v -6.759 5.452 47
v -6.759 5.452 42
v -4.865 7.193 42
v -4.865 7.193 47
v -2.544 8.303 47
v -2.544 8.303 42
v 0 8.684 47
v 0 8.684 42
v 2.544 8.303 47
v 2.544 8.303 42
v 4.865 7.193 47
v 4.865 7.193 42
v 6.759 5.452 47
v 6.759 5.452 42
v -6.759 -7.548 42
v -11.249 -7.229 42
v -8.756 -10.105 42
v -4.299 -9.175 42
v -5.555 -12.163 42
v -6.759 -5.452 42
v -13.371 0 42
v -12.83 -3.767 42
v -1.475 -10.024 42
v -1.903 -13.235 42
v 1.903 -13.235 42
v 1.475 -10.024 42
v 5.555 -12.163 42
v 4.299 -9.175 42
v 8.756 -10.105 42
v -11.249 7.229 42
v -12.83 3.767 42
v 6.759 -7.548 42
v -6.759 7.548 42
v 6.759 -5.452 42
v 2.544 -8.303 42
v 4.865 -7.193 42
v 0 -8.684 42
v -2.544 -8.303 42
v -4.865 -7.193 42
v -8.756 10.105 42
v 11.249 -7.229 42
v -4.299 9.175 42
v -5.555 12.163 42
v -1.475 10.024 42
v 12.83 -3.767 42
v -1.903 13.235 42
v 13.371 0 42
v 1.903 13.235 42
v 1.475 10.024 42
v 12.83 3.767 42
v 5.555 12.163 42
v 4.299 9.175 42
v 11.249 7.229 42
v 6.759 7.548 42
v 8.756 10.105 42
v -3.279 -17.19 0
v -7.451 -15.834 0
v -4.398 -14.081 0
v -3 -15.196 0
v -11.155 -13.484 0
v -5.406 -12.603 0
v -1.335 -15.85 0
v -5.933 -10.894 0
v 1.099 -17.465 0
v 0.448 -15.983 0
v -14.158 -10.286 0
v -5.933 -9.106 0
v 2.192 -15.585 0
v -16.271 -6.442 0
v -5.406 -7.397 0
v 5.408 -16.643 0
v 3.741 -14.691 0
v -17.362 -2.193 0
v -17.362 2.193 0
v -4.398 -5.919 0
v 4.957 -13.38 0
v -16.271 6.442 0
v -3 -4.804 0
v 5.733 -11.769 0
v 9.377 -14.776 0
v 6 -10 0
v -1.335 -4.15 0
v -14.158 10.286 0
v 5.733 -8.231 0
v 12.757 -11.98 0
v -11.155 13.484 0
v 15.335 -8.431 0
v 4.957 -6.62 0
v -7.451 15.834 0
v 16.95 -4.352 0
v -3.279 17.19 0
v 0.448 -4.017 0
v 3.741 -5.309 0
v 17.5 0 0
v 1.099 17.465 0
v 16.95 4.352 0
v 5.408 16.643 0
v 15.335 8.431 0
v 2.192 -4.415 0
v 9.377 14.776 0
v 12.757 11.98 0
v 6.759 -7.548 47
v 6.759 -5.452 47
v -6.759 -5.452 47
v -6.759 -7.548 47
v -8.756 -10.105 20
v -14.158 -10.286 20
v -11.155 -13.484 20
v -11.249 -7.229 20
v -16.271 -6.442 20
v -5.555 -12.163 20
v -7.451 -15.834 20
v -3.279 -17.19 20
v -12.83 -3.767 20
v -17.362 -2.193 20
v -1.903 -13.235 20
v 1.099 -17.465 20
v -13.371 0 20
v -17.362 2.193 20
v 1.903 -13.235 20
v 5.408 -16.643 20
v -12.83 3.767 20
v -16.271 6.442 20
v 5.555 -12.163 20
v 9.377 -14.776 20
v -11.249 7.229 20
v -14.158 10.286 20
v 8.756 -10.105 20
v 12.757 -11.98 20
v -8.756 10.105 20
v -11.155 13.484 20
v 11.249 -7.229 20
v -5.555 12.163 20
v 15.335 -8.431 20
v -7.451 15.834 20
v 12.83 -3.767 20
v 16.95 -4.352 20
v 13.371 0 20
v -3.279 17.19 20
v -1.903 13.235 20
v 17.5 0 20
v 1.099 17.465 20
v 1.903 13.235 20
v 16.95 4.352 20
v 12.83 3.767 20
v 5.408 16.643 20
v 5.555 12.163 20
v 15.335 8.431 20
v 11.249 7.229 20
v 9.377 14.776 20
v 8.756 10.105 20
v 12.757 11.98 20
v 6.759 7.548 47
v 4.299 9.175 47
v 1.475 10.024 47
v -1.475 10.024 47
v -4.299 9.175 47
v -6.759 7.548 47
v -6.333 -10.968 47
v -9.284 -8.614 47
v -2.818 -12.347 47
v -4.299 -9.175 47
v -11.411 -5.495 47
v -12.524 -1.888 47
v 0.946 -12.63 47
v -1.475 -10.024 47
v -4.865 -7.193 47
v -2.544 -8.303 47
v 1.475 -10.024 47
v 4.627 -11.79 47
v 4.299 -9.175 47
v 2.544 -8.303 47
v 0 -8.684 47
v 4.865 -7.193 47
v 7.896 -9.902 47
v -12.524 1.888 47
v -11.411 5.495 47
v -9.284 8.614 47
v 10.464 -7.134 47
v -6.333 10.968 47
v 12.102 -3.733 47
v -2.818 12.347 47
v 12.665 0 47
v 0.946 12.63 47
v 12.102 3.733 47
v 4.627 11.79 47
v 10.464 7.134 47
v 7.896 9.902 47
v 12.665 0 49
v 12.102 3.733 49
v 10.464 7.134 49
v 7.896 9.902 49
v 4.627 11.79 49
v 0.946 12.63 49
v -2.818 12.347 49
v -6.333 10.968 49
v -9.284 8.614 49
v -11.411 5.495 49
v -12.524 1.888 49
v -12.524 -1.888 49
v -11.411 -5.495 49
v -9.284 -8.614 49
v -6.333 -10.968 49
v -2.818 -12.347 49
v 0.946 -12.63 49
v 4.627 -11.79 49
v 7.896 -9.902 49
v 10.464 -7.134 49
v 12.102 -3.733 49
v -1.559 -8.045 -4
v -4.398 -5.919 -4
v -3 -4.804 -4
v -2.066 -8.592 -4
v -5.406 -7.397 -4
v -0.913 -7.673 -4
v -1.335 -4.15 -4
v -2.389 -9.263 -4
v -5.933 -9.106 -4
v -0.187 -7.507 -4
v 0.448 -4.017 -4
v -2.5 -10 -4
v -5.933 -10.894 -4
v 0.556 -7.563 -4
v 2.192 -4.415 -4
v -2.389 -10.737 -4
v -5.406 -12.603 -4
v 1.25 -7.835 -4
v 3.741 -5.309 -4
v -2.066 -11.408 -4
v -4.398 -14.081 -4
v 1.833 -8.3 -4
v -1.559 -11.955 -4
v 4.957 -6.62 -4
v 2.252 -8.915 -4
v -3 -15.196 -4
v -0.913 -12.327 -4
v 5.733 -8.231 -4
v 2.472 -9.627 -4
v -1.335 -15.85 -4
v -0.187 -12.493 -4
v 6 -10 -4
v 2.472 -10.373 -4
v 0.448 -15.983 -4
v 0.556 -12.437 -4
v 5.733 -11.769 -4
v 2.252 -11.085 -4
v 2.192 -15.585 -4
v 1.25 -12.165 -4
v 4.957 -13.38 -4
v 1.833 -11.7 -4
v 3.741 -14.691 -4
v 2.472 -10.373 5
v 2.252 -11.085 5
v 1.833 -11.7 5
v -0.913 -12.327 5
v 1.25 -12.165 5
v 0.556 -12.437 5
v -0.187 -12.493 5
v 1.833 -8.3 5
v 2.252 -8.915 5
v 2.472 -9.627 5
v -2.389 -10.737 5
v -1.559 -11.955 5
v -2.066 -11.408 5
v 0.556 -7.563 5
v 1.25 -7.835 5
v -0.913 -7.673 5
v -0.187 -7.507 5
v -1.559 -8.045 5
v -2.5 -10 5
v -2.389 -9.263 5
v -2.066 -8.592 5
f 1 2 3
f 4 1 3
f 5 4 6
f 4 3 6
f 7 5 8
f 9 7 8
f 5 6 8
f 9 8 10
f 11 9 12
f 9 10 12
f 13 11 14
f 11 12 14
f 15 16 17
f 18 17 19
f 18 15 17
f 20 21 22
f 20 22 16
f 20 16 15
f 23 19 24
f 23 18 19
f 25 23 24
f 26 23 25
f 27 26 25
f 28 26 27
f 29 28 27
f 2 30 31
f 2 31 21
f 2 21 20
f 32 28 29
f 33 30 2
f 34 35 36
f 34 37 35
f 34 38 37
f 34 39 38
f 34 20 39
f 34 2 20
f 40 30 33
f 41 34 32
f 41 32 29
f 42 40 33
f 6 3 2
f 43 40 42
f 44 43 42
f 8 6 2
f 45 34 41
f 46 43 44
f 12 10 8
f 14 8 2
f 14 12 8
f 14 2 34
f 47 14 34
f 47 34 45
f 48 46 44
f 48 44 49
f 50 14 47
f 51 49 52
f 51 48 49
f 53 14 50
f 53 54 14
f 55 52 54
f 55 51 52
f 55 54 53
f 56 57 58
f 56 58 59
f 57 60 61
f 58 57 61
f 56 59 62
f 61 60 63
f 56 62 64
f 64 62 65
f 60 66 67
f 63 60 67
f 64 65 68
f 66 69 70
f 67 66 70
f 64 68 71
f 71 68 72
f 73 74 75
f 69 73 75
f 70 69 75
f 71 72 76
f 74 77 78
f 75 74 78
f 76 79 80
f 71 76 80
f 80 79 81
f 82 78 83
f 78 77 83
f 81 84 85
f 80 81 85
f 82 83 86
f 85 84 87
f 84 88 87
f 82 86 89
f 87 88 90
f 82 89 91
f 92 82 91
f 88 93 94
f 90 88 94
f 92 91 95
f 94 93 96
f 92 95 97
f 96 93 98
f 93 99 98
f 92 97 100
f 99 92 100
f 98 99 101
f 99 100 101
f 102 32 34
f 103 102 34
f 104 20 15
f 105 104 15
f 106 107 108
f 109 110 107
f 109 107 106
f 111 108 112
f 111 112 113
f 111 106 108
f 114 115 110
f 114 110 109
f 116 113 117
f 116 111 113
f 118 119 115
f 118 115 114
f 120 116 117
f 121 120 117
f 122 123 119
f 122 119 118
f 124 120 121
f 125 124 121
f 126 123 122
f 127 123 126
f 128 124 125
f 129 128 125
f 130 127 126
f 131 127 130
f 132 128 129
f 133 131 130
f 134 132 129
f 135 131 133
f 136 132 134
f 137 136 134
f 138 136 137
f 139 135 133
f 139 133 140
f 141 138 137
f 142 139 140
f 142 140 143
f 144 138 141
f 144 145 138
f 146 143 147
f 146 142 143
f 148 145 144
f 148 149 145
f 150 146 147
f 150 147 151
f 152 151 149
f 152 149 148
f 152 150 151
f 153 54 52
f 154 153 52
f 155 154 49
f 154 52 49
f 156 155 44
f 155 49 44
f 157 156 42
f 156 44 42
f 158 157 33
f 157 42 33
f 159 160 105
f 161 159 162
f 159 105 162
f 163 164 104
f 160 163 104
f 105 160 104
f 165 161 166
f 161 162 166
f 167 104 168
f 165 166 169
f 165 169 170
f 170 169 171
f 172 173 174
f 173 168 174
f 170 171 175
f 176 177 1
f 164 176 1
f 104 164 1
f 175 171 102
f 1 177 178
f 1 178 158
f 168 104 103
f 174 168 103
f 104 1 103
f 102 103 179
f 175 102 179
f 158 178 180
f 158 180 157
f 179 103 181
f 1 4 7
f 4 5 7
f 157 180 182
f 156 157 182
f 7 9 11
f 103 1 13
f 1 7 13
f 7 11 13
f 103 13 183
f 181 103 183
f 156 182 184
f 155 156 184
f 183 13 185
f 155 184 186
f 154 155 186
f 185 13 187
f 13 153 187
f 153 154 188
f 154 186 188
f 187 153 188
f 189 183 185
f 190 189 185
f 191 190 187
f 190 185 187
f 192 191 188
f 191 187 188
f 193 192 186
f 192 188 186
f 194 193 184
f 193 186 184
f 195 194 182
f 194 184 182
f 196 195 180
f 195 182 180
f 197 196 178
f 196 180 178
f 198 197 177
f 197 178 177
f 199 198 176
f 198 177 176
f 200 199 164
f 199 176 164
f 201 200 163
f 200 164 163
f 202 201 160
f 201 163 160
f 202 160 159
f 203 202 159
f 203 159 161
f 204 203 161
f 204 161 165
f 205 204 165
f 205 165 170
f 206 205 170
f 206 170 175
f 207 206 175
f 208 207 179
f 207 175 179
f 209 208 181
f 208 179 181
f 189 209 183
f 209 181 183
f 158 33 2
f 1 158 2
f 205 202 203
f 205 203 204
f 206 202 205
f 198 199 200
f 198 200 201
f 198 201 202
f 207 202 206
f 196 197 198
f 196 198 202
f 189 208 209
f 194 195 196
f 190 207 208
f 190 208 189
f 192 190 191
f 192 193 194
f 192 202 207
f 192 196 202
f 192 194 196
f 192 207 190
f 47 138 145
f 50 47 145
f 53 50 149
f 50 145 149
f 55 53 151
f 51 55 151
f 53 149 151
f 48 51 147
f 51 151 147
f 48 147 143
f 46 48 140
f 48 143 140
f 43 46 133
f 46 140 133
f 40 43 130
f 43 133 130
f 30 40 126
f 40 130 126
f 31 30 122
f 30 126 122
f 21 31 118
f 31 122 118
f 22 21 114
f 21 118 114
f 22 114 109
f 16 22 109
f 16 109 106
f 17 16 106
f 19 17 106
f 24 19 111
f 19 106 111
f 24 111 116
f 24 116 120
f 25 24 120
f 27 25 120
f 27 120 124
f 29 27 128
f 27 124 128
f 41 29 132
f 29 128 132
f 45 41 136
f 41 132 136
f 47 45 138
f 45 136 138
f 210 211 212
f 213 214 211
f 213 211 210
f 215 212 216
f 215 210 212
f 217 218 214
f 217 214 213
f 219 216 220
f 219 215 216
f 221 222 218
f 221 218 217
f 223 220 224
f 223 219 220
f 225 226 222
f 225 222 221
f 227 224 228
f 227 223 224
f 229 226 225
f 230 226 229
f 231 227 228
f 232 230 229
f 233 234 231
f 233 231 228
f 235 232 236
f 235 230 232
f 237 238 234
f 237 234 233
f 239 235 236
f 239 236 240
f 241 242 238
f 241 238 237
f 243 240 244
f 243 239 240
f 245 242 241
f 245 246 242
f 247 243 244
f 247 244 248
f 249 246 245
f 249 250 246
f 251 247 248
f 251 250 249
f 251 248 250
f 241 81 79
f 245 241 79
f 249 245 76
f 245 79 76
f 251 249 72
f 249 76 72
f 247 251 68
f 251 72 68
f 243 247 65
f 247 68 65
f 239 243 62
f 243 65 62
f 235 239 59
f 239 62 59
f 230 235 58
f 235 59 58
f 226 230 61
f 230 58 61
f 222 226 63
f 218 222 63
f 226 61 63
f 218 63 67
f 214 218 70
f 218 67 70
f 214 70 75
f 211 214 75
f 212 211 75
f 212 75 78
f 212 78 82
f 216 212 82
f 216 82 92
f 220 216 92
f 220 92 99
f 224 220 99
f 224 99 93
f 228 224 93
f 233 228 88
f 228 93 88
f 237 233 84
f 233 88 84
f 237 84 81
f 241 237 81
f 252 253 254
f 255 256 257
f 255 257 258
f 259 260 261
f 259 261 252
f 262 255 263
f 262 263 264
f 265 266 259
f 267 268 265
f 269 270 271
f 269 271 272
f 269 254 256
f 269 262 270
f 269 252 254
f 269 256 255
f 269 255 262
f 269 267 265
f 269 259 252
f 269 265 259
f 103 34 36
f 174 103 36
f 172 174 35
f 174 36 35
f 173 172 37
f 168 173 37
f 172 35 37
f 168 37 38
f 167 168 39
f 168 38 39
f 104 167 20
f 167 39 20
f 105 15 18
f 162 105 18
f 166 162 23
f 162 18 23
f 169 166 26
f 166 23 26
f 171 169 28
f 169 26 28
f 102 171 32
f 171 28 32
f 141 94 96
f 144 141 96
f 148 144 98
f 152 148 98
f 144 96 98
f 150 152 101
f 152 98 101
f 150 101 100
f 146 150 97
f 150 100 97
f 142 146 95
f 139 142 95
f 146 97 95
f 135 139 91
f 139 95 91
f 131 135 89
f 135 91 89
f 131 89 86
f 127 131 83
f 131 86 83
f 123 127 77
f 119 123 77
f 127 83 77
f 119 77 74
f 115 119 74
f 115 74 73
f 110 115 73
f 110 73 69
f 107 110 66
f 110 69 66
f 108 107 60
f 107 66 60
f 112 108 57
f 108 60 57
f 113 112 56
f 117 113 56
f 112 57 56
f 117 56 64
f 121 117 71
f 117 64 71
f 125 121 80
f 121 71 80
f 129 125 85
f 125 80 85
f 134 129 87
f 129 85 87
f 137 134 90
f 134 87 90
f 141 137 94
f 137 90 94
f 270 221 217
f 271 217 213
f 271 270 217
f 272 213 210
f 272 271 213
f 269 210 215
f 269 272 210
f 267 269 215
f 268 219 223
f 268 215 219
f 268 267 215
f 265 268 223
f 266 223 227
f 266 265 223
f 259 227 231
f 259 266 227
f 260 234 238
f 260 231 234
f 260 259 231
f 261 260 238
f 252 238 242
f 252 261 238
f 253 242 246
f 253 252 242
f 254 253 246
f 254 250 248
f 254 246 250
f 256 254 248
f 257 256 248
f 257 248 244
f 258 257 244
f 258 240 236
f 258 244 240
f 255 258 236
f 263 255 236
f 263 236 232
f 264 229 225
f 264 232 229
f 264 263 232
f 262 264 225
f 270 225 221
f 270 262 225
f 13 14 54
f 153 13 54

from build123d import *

# Parameters (mm, degrees)
SKETCH1_R           = 17.5
BOSS_EXTRUDE1_DEPTH = 20
SKETCH2_R           = 13.371126373
BOSS_EXTRUDE2_DEPTH = 22
BOSS_EXTRUDE3_DEPTH = 5
SKETCH4_R           = 12.665000137
BOSS_EXTRUDE4_DEPTH = 2
SKETCH5_R           = 2.5
BOSS_EXTRUDE5_DEPTH = 20
SKETCH6_R           = 6
SKETCH6_R_2         = 2.5
BOSS_EXTRUDE6_DEPTH = 4
CUT_EXTRUDE1_START  = -25
SKETCH8_R           = 2.5
CUT_EXTRUDE1_DEPTH  = 25


with BuildPart() as part:
    # Sketch1 → Boss-Extrude1 (new body)
    with BuildSketch(Plane.XY):
        Circle(SKETCH1_R)
    extrude(amount=BOSS_EXTRUDE1_DEPTH)

    # Sketch2 → Boss-Extrude2 (add)
    with BuildSketch(Plane.XY.offset(20)):
        Circle(SKETCH2_R)
    extrude(amount=BOSS_EXTRUDE2_DEPTH)

    # Sketch3 → Boss-Extrude3 (add)
    with BuildSketch(Plane.XY.offset(42)):
        with BuildLine():
            Line((-6.759376189, 7.547571999), (-6.759376189, 5.4522877))
            ThreePointArc((-6.759376189, 5.4522877), (0, 8.684273581), (6.759376189, 5.4522877))
            Line((6.759376189, 5.4522877), (6.759376189, 7.547571999))
            ThreePointArc((6.759376189, 7.547571999), (0, 10.131880849), (-6.759376189, 7.547571999))
        make_face()
        with BuildLine():
            Line((-6.759376189, -5.4522877), (-6.759376189, -7.547571999))
            ThreePointArc((-6.759376189, -7.547571999), (0, -10.131880849), (6.759376189, -7.547571999))
            Line((6.759376189, -7.547571999), (6.759376189, -5.4522877))
            ThreePointArc((6.759376189, -5.4522877), (0, -8.684273581), (-6.759376189, -5.4522877))
        make_face()
    extrude(amount=BOSS_EXTRUDE3_DEPTH)

    # Sketch4 → Boss-Extrude4 (add)
    with BuildSketch(Plane.XY.offset(47)):
        Circle(SKETCH4_R)
    extrude(amount=BOSS_EXTRUDE4_DEPTH)

    # Sketch5 → Boss-Extrude5 (add)
    with BuildSketch(Plane(origin=(0, 0, 0), x_dir=(-1, 0, 0), z_dir=(0, 0, -1))):
        with Locations(Location((0, -10, 0), (0, 0, 180))):
            Circle(SKETCH5_R)
    extrude(amount=BOSS_EXTRUDE5_DEPTH)

    # Sketch6 → Boss-Extrude6 (add)
    with BuildSketch(Plane(origin=(0, 0, 0), x_dir=(-1, 0, 0), z_dir=(0, 0, -1))):
        with Locations(Location((0, -10, 0), (0, 0, 180))):
            Circle(SKETCH6_R)
        with Locations((0, -10)):
            Circle(SKETCH6_R_2, mode=Mode.SUBTRACT)
    extrude(amount=BOSS_EXTRUDE6_DEPTH)

    # Sketch8 → Cut-Extrude1 (cut)
    with BuildSketch(Plane(origin=(0, 0, -20), x_dir=(-1, 0, 0), z_dir=(0, 0, -1)).offset(CUT_EXTRUDE1_START)):
        with Locations((0, -10)):
            Circle(SKETCH8_R)
    extrude(amount=CUT_EXTRUDE1_DEPTH, mode=Mode.SUBTRACT)


solid = part.part
